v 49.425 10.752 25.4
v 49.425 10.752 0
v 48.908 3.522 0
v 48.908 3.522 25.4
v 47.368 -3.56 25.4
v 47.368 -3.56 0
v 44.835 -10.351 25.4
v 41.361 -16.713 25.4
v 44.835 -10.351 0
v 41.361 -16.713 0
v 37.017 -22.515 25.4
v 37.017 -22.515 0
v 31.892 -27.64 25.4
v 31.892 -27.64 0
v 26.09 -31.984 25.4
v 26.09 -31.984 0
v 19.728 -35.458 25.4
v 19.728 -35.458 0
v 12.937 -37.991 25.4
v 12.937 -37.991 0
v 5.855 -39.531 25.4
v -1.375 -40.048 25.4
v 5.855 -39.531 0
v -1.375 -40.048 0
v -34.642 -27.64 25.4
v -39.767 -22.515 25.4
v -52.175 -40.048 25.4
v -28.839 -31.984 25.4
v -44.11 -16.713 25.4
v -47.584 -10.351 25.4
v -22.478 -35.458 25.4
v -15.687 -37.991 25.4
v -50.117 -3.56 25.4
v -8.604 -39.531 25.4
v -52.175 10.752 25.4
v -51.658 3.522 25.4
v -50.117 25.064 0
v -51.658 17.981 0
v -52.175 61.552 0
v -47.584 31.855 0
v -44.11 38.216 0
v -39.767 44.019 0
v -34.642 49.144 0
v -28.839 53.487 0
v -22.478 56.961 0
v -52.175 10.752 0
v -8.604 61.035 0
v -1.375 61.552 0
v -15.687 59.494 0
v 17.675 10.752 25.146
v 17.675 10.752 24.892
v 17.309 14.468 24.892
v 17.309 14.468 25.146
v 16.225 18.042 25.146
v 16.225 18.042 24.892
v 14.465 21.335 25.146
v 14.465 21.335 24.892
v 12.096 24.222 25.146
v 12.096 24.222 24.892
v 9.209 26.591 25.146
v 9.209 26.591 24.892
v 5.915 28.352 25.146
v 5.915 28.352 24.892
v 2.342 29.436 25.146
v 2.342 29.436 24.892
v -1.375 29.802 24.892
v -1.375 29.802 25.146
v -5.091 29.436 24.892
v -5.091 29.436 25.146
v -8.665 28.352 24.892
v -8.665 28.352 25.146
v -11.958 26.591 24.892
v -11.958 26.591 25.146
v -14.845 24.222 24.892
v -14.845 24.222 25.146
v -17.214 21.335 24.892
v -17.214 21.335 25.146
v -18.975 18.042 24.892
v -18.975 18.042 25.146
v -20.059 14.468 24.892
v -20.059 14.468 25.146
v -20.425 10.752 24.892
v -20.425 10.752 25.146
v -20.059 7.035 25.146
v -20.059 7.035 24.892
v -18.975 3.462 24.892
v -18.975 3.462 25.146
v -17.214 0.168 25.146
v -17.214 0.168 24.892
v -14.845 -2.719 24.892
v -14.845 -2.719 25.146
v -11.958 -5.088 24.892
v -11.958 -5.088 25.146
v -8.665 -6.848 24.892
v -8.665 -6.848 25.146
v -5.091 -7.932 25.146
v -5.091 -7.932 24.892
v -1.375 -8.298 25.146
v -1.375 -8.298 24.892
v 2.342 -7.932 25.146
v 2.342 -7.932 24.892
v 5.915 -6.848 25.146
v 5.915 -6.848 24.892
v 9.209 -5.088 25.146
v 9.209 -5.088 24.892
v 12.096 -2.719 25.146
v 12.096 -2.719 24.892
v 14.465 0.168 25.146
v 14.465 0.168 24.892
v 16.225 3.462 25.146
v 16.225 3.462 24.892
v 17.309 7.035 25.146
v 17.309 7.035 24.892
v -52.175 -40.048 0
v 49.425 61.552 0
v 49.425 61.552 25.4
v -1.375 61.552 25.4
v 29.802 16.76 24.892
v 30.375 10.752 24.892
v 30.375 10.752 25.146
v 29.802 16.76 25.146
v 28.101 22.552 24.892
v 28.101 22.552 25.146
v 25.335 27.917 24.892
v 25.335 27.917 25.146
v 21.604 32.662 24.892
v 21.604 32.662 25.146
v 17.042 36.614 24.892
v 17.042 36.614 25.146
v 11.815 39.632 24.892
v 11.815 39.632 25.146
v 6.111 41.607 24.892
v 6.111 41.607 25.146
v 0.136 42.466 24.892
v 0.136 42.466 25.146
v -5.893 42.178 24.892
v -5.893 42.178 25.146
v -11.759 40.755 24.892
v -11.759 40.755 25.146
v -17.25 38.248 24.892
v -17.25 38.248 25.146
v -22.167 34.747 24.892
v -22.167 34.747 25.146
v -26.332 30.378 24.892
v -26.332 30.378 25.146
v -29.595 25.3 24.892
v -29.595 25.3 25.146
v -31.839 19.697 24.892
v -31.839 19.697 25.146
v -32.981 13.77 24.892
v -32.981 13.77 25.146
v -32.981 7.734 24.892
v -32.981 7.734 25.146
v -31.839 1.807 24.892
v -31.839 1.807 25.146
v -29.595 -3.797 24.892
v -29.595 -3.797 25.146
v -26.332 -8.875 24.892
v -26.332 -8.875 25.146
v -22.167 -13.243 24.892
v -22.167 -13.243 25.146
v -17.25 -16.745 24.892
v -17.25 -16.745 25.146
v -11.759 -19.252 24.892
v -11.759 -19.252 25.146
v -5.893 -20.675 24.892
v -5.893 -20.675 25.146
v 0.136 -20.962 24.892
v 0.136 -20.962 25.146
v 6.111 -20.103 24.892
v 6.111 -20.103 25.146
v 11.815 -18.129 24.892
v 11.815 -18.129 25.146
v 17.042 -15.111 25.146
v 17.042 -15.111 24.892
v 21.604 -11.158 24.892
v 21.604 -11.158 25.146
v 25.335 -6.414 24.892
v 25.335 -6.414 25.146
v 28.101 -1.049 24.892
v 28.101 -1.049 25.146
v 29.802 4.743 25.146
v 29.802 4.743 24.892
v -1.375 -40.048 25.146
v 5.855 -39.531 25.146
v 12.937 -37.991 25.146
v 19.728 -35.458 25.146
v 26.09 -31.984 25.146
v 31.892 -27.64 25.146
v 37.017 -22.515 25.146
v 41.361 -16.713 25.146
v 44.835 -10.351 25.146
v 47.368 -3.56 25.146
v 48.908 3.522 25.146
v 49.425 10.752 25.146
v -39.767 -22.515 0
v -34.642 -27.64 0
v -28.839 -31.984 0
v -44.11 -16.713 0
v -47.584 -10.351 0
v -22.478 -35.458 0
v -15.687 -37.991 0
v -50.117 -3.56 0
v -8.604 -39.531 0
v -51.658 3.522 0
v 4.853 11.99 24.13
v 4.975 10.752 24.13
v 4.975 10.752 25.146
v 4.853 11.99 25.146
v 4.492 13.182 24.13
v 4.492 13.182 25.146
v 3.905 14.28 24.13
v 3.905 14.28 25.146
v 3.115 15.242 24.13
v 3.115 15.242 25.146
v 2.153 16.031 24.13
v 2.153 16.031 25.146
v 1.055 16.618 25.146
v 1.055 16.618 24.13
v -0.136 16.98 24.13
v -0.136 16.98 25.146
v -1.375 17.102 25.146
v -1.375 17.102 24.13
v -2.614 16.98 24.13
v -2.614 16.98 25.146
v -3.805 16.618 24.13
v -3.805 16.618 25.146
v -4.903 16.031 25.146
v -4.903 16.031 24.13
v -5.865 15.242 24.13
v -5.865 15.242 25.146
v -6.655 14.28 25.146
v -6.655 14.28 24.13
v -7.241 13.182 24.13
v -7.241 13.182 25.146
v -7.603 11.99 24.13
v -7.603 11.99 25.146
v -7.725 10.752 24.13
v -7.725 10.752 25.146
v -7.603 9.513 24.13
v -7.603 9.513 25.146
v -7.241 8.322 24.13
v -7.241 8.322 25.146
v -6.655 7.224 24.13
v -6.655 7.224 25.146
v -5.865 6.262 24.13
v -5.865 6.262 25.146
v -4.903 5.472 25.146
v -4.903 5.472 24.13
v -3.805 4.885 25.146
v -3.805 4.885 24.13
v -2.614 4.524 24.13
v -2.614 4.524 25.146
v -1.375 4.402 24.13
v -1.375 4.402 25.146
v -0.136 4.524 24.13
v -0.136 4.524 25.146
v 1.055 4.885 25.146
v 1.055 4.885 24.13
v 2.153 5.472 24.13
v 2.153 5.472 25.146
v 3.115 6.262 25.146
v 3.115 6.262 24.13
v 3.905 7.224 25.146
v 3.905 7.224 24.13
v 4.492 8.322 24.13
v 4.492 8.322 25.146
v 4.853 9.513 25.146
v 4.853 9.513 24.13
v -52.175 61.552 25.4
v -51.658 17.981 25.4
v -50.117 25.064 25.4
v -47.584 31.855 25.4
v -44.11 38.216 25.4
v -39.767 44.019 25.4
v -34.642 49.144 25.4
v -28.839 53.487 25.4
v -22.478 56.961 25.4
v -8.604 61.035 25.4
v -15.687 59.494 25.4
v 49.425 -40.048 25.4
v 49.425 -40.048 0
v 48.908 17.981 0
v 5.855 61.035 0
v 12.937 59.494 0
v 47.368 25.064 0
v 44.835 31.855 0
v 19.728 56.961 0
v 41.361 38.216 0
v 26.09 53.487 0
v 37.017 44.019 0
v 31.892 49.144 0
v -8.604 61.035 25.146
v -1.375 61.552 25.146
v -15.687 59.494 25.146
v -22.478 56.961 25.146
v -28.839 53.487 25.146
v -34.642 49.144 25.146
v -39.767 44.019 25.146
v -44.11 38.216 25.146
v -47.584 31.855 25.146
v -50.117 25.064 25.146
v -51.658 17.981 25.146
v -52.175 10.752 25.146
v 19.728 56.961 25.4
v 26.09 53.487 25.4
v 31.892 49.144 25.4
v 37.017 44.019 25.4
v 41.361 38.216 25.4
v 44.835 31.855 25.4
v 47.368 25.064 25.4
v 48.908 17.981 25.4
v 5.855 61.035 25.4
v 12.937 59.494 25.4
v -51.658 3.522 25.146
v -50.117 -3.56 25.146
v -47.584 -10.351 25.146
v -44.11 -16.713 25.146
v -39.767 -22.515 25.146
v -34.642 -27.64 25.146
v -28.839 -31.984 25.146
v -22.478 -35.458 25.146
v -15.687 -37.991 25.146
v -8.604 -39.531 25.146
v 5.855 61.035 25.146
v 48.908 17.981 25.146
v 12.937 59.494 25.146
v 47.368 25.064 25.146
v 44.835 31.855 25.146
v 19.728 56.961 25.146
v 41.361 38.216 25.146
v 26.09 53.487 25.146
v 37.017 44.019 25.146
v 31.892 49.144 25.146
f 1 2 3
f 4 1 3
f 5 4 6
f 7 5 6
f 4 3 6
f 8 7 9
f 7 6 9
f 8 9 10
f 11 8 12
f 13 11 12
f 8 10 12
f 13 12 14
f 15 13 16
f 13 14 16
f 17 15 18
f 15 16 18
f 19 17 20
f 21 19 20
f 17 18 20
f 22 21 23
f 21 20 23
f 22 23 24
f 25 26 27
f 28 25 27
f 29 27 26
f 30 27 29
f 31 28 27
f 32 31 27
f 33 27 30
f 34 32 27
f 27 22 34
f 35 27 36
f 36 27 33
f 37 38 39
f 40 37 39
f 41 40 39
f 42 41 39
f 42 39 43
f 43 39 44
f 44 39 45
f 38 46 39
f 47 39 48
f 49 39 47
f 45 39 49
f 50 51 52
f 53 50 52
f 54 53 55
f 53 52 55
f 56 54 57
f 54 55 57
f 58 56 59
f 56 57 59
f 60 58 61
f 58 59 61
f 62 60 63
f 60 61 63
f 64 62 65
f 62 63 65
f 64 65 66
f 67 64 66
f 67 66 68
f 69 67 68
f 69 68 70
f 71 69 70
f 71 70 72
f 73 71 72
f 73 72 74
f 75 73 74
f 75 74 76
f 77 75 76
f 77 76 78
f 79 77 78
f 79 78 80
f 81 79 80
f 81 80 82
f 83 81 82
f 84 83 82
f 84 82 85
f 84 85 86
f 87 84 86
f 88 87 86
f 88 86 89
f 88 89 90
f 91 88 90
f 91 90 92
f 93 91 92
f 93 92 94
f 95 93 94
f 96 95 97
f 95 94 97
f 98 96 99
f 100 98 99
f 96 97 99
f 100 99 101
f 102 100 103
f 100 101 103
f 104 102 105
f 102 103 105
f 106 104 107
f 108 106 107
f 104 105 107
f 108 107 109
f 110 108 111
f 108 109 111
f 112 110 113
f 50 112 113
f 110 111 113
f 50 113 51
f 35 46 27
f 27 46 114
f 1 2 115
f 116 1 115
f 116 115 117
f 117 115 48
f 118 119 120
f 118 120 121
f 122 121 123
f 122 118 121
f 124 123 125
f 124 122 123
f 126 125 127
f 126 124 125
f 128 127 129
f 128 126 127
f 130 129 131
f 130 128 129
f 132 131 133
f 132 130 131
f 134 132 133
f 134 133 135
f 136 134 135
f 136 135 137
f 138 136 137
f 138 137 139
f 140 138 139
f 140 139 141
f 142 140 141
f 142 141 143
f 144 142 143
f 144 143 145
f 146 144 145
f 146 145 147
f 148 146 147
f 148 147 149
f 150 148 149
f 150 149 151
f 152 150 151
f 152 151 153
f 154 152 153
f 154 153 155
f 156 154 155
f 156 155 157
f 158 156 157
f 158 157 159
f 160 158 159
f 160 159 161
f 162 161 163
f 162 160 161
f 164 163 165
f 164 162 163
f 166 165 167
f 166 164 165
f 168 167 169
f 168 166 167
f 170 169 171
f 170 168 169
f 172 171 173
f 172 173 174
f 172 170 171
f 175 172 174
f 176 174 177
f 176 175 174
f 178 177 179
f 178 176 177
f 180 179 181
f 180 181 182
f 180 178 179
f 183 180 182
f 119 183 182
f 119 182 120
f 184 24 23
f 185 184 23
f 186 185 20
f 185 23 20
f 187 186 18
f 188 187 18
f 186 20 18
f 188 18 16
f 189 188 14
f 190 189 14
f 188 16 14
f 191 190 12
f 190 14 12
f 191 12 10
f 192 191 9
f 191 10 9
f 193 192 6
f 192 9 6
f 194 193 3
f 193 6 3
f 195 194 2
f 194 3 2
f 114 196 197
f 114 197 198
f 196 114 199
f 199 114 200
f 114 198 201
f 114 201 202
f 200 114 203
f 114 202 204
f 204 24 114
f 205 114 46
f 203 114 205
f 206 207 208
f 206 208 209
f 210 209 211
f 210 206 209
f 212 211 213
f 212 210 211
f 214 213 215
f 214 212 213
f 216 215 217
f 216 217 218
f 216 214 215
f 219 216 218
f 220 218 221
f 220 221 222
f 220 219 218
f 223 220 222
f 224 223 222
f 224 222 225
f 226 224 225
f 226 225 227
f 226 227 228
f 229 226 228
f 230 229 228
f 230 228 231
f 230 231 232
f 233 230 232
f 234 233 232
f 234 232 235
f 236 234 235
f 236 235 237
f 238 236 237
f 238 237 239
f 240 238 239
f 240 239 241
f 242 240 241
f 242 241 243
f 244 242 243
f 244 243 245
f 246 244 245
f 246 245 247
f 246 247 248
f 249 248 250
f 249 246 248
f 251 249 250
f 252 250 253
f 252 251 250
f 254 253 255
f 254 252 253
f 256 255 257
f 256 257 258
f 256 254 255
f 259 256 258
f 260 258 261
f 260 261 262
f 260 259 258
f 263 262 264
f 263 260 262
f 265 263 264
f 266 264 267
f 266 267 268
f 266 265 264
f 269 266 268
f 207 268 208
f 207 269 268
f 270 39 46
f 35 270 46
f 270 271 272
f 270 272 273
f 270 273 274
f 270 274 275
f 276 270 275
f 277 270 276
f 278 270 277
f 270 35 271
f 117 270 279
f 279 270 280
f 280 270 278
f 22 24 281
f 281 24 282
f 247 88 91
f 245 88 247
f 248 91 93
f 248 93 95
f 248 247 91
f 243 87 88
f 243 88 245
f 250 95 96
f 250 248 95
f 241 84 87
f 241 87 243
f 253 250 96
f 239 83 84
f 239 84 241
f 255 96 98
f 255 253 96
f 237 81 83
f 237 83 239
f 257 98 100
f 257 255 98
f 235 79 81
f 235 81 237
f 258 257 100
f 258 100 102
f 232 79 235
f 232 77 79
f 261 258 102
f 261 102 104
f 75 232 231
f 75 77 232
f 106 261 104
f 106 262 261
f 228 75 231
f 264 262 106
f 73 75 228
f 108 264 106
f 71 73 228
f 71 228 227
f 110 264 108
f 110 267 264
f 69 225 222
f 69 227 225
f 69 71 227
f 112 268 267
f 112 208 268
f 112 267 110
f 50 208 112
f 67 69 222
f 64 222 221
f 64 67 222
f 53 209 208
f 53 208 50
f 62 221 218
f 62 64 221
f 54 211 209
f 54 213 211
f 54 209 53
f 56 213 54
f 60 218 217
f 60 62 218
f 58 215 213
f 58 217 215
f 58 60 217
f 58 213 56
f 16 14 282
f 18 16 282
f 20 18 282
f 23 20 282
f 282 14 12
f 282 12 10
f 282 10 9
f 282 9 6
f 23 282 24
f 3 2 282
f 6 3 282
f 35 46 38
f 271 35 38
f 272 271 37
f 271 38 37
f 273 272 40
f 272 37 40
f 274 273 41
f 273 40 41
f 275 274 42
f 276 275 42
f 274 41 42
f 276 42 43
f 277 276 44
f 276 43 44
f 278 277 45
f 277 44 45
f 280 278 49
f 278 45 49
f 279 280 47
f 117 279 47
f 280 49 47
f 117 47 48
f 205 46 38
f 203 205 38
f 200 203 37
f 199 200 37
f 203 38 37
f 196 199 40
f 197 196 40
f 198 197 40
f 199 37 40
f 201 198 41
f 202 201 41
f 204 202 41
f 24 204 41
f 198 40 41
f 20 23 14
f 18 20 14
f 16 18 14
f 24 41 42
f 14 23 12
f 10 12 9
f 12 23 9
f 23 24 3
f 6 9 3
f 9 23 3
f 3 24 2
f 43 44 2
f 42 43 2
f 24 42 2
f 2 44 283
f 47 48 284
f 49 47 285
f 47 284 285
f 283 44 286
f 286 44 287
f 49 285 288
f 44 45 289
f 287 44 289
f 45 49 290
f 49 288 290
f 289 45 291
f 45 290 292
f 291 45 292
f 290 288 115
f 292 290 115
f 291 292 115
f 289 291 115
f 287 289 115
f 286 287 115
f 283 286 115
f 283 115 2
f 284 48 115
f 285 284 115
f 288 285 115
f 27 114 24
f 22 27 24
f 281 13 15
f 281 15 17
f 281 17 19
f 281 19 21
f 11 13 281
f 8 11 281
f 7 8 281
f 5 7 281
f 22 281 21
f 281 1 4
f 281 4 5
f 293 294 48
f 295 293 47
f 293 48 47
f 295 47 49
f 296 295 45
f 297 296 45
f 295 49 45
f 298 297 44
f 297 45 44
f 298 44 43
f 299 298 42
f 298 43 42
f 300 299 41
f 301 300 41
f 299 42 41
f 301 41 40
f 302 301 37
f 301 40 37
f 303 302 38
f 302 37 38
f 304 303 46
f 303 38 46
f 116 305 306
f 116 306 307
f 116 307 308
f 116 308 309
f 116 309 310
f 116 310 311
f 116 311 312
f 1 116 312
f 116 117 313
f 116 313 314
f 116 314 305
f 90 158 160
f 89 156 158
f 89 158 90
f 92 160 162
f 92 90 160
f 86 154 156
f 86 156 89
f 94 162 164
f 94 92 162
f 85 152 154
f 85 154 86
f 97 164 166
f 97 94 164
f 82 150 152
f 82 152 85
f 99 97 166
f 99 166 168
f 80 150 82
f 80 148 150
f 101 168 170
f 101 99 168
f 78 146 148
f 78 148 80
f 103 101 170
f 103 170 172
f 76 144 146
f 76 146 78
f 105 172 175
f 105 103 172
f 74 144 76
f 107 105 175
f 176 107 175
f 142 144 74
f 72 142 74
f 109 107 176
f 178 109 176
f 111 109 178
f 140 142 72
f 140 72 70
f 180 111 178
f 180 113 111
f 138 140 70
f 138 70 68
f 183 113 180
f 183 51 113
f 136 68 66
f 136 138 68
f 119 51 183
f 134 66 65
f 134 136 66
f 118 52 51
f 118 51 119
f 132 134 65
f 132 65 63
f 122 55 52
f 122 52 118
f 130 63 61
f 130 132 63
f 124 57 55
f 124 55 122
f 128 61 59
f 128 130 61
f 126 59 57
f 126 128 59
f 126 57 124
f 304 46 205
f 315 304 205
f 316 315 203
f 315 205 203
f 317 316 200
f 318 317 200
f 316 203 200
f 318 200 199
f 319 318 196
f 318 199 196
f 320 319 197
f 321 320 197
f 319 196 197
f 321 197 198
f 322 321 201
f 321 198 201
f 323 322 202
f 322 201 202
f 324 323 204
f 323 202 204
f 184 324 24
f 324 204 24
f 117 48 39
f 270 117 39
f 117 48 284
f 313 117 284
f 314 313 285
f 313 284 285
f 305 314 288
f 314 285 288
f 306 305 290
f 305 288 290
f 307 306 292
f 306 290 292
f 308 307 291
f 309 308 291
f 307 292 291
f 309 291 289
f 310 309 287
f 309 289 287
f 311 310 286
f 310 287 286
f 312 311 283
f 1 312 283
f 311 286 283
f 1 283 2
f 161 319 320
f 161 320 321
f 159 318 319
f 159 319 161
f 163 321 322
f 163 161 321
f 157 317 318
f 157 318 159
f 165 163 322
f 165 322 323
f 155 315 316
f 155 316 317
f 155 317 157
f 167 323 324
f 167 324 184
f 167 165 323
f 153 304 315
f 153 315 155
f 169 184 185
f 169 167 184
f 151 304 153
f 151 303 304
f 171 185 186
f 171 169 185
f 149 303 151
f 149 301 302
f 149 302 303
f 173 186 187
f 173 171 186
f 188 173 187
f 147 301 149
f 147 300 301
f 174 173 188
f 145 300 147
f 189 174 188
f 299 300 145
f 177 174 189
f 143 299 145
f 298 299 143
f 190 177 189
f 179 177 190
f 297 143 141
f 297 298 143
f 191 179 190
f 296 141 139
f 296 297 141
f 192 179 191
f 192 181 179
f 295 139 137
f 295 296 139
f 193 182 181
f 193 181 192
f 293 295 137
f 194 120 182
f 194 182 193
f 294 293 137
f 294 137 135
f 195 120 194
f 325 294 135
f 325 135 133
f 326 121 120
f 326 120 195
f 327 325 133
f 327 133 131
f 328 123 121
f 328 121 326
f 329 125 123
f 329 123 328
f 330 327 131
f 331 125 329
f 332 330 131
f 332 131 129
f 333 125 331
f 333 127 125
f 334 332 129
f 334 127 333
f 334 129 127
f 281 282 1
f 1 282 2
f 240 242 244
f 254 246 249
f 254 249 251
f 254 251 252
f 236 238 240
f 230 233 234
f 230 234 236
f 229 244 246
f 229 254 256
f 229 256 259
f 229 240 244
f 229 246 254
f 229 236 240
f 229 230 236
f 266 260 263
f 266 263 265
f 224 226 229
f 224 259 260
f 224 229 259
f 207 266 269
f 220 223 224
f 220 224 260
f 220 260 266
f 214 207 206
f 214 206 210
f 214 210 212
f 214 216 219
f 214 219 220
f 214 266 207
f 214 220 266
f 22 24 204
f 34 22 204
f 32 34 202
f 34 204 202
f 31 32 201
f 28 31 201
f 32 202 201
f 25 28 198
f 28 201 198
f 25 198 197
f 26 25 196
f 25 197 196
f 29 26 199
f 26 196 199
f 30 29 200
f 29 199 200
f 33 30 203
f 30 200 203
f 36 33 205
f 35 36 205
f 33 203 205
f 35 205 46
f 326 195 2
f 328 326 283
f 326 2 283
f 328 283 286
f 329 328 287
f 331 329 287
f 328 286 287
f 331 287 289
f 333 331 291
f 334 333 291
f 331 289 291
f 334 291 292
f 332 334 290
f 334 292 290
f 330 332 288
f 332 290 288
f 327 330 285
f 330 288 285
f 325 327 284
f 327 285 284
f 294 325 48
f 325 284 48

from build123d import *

# Parameters (mm, degrees)
F1_DEPTH = 25.4
F0_R     = 31.75
F2_DEPTH = 25.146
F0_R_2   = 19.05
F3_DEPTH = 24.892
F0_R_3   = 6.35
F4_DEPTH = 25.146
F5_DEPTH = 24.13


with BuildPart() as f1:
    # F0 (on Top) → F1 (new body)
    with BuildSketch(Plane.XY):
        with BuildLine():
            Line((-52.174702, 61.551638), (-52.174702, 10.751638))
            ThreePointArc((-52.174702, 10.751638), (-37.295726, 46.672662), (-1.374702, 61.551638))
            Line((-1.374702, 61.551638), (-52.174702, 61.551638))
        make_face()
        with BuildLine():
            ThreePointArc((-1.374702, 61.551638), (34.546323, 46.672662), (49.425298, 10.751638))
            Line((49.425298, 10.751638), (49.425298, 61.551638))
            Line((49.425298, 61.551638), (-1.374702, 61.551638))
        make_face()
        with BuildLine():
            Line((-1.374702, -40.048362), (49.425298, -40.048362))
            Line((49.425298, -40.048362), (49.425298, 10.751638))
            ThreePointArc((49.425298, 10.751638), (34.546323, -25.169387), (-1.374702, -40.048362))
        make_face()
        with BuildLine():
            Line((-52.174702, -40.048362), (-1.374702, -40.048362))
            ThreePointArc((-1.374702, -40.048362), (-37.295726, -25.169387), (-52.174702, 10.751638))
            Line((-52.174702, 10.751638), (-52.174702, -40.048362))
        make_face()
    extrude(amount=F1_DEPTH)


with BuildPart() as f2:
    # F0 (on Top) → F2 (new body)
    with BuildSketch(Plane.XY):
        with BuildLine():
            ThreePointArc((-52.174702, 10.751638), (-37.295726, -25.169387), (-1.374702, -40.048362))
            ThreePointArc((-1.374702, -40.048362), (34.546323, -25.169387), (49.425298, 10.751638))
            ThreePointArc((49.425298, 10.751638), (34.546323, 46.672662), (-1.374702, 61.551638))
            ThreePointArc((-1.374702, 61.551638), (-37.295726, 46.672662), (-52.174702, 10.751638))
        make_face()
        with Locations((-1.374702, 10.751638)):
            Circle(F0_R, mode=Mode.SUBTRACT)
    extrude(amount=F2_DEPTH)

    # F0 (on Top) → F3 (join)
    with BuildSketch(Plane.XY):
        with Locations((-1.374702, 10.751638)):
            Circle(F0_R)
        with Locations((-1.374702, 10.751638)):
            Circle(F0_R_2, mode=Mode.SUBTRACT)
    extrude(amount=F3_DEPTH)

    # F0 (on Top) → F4 (join)
    with BuildSketch(Plane.XY):
        with Locations((-1.374702, 10.751638)):
            Circle(F0_R_2)
        with Locations((-1.374702, 10.751638)):
            Circle(F0_R_3, mode=Mode.SUBTRACT)
    extrude(amount=F4_DEPTH)

    # F0 (on Top) → F5 (join)
    with BuildSketch(Plane.XY):
        with Locations((-1.374702, 10.751638)):
            Circle(F0_R_3)
    extrude(amount=F5_DEPTH)


solid = Compound([f1.part, f2.part])
